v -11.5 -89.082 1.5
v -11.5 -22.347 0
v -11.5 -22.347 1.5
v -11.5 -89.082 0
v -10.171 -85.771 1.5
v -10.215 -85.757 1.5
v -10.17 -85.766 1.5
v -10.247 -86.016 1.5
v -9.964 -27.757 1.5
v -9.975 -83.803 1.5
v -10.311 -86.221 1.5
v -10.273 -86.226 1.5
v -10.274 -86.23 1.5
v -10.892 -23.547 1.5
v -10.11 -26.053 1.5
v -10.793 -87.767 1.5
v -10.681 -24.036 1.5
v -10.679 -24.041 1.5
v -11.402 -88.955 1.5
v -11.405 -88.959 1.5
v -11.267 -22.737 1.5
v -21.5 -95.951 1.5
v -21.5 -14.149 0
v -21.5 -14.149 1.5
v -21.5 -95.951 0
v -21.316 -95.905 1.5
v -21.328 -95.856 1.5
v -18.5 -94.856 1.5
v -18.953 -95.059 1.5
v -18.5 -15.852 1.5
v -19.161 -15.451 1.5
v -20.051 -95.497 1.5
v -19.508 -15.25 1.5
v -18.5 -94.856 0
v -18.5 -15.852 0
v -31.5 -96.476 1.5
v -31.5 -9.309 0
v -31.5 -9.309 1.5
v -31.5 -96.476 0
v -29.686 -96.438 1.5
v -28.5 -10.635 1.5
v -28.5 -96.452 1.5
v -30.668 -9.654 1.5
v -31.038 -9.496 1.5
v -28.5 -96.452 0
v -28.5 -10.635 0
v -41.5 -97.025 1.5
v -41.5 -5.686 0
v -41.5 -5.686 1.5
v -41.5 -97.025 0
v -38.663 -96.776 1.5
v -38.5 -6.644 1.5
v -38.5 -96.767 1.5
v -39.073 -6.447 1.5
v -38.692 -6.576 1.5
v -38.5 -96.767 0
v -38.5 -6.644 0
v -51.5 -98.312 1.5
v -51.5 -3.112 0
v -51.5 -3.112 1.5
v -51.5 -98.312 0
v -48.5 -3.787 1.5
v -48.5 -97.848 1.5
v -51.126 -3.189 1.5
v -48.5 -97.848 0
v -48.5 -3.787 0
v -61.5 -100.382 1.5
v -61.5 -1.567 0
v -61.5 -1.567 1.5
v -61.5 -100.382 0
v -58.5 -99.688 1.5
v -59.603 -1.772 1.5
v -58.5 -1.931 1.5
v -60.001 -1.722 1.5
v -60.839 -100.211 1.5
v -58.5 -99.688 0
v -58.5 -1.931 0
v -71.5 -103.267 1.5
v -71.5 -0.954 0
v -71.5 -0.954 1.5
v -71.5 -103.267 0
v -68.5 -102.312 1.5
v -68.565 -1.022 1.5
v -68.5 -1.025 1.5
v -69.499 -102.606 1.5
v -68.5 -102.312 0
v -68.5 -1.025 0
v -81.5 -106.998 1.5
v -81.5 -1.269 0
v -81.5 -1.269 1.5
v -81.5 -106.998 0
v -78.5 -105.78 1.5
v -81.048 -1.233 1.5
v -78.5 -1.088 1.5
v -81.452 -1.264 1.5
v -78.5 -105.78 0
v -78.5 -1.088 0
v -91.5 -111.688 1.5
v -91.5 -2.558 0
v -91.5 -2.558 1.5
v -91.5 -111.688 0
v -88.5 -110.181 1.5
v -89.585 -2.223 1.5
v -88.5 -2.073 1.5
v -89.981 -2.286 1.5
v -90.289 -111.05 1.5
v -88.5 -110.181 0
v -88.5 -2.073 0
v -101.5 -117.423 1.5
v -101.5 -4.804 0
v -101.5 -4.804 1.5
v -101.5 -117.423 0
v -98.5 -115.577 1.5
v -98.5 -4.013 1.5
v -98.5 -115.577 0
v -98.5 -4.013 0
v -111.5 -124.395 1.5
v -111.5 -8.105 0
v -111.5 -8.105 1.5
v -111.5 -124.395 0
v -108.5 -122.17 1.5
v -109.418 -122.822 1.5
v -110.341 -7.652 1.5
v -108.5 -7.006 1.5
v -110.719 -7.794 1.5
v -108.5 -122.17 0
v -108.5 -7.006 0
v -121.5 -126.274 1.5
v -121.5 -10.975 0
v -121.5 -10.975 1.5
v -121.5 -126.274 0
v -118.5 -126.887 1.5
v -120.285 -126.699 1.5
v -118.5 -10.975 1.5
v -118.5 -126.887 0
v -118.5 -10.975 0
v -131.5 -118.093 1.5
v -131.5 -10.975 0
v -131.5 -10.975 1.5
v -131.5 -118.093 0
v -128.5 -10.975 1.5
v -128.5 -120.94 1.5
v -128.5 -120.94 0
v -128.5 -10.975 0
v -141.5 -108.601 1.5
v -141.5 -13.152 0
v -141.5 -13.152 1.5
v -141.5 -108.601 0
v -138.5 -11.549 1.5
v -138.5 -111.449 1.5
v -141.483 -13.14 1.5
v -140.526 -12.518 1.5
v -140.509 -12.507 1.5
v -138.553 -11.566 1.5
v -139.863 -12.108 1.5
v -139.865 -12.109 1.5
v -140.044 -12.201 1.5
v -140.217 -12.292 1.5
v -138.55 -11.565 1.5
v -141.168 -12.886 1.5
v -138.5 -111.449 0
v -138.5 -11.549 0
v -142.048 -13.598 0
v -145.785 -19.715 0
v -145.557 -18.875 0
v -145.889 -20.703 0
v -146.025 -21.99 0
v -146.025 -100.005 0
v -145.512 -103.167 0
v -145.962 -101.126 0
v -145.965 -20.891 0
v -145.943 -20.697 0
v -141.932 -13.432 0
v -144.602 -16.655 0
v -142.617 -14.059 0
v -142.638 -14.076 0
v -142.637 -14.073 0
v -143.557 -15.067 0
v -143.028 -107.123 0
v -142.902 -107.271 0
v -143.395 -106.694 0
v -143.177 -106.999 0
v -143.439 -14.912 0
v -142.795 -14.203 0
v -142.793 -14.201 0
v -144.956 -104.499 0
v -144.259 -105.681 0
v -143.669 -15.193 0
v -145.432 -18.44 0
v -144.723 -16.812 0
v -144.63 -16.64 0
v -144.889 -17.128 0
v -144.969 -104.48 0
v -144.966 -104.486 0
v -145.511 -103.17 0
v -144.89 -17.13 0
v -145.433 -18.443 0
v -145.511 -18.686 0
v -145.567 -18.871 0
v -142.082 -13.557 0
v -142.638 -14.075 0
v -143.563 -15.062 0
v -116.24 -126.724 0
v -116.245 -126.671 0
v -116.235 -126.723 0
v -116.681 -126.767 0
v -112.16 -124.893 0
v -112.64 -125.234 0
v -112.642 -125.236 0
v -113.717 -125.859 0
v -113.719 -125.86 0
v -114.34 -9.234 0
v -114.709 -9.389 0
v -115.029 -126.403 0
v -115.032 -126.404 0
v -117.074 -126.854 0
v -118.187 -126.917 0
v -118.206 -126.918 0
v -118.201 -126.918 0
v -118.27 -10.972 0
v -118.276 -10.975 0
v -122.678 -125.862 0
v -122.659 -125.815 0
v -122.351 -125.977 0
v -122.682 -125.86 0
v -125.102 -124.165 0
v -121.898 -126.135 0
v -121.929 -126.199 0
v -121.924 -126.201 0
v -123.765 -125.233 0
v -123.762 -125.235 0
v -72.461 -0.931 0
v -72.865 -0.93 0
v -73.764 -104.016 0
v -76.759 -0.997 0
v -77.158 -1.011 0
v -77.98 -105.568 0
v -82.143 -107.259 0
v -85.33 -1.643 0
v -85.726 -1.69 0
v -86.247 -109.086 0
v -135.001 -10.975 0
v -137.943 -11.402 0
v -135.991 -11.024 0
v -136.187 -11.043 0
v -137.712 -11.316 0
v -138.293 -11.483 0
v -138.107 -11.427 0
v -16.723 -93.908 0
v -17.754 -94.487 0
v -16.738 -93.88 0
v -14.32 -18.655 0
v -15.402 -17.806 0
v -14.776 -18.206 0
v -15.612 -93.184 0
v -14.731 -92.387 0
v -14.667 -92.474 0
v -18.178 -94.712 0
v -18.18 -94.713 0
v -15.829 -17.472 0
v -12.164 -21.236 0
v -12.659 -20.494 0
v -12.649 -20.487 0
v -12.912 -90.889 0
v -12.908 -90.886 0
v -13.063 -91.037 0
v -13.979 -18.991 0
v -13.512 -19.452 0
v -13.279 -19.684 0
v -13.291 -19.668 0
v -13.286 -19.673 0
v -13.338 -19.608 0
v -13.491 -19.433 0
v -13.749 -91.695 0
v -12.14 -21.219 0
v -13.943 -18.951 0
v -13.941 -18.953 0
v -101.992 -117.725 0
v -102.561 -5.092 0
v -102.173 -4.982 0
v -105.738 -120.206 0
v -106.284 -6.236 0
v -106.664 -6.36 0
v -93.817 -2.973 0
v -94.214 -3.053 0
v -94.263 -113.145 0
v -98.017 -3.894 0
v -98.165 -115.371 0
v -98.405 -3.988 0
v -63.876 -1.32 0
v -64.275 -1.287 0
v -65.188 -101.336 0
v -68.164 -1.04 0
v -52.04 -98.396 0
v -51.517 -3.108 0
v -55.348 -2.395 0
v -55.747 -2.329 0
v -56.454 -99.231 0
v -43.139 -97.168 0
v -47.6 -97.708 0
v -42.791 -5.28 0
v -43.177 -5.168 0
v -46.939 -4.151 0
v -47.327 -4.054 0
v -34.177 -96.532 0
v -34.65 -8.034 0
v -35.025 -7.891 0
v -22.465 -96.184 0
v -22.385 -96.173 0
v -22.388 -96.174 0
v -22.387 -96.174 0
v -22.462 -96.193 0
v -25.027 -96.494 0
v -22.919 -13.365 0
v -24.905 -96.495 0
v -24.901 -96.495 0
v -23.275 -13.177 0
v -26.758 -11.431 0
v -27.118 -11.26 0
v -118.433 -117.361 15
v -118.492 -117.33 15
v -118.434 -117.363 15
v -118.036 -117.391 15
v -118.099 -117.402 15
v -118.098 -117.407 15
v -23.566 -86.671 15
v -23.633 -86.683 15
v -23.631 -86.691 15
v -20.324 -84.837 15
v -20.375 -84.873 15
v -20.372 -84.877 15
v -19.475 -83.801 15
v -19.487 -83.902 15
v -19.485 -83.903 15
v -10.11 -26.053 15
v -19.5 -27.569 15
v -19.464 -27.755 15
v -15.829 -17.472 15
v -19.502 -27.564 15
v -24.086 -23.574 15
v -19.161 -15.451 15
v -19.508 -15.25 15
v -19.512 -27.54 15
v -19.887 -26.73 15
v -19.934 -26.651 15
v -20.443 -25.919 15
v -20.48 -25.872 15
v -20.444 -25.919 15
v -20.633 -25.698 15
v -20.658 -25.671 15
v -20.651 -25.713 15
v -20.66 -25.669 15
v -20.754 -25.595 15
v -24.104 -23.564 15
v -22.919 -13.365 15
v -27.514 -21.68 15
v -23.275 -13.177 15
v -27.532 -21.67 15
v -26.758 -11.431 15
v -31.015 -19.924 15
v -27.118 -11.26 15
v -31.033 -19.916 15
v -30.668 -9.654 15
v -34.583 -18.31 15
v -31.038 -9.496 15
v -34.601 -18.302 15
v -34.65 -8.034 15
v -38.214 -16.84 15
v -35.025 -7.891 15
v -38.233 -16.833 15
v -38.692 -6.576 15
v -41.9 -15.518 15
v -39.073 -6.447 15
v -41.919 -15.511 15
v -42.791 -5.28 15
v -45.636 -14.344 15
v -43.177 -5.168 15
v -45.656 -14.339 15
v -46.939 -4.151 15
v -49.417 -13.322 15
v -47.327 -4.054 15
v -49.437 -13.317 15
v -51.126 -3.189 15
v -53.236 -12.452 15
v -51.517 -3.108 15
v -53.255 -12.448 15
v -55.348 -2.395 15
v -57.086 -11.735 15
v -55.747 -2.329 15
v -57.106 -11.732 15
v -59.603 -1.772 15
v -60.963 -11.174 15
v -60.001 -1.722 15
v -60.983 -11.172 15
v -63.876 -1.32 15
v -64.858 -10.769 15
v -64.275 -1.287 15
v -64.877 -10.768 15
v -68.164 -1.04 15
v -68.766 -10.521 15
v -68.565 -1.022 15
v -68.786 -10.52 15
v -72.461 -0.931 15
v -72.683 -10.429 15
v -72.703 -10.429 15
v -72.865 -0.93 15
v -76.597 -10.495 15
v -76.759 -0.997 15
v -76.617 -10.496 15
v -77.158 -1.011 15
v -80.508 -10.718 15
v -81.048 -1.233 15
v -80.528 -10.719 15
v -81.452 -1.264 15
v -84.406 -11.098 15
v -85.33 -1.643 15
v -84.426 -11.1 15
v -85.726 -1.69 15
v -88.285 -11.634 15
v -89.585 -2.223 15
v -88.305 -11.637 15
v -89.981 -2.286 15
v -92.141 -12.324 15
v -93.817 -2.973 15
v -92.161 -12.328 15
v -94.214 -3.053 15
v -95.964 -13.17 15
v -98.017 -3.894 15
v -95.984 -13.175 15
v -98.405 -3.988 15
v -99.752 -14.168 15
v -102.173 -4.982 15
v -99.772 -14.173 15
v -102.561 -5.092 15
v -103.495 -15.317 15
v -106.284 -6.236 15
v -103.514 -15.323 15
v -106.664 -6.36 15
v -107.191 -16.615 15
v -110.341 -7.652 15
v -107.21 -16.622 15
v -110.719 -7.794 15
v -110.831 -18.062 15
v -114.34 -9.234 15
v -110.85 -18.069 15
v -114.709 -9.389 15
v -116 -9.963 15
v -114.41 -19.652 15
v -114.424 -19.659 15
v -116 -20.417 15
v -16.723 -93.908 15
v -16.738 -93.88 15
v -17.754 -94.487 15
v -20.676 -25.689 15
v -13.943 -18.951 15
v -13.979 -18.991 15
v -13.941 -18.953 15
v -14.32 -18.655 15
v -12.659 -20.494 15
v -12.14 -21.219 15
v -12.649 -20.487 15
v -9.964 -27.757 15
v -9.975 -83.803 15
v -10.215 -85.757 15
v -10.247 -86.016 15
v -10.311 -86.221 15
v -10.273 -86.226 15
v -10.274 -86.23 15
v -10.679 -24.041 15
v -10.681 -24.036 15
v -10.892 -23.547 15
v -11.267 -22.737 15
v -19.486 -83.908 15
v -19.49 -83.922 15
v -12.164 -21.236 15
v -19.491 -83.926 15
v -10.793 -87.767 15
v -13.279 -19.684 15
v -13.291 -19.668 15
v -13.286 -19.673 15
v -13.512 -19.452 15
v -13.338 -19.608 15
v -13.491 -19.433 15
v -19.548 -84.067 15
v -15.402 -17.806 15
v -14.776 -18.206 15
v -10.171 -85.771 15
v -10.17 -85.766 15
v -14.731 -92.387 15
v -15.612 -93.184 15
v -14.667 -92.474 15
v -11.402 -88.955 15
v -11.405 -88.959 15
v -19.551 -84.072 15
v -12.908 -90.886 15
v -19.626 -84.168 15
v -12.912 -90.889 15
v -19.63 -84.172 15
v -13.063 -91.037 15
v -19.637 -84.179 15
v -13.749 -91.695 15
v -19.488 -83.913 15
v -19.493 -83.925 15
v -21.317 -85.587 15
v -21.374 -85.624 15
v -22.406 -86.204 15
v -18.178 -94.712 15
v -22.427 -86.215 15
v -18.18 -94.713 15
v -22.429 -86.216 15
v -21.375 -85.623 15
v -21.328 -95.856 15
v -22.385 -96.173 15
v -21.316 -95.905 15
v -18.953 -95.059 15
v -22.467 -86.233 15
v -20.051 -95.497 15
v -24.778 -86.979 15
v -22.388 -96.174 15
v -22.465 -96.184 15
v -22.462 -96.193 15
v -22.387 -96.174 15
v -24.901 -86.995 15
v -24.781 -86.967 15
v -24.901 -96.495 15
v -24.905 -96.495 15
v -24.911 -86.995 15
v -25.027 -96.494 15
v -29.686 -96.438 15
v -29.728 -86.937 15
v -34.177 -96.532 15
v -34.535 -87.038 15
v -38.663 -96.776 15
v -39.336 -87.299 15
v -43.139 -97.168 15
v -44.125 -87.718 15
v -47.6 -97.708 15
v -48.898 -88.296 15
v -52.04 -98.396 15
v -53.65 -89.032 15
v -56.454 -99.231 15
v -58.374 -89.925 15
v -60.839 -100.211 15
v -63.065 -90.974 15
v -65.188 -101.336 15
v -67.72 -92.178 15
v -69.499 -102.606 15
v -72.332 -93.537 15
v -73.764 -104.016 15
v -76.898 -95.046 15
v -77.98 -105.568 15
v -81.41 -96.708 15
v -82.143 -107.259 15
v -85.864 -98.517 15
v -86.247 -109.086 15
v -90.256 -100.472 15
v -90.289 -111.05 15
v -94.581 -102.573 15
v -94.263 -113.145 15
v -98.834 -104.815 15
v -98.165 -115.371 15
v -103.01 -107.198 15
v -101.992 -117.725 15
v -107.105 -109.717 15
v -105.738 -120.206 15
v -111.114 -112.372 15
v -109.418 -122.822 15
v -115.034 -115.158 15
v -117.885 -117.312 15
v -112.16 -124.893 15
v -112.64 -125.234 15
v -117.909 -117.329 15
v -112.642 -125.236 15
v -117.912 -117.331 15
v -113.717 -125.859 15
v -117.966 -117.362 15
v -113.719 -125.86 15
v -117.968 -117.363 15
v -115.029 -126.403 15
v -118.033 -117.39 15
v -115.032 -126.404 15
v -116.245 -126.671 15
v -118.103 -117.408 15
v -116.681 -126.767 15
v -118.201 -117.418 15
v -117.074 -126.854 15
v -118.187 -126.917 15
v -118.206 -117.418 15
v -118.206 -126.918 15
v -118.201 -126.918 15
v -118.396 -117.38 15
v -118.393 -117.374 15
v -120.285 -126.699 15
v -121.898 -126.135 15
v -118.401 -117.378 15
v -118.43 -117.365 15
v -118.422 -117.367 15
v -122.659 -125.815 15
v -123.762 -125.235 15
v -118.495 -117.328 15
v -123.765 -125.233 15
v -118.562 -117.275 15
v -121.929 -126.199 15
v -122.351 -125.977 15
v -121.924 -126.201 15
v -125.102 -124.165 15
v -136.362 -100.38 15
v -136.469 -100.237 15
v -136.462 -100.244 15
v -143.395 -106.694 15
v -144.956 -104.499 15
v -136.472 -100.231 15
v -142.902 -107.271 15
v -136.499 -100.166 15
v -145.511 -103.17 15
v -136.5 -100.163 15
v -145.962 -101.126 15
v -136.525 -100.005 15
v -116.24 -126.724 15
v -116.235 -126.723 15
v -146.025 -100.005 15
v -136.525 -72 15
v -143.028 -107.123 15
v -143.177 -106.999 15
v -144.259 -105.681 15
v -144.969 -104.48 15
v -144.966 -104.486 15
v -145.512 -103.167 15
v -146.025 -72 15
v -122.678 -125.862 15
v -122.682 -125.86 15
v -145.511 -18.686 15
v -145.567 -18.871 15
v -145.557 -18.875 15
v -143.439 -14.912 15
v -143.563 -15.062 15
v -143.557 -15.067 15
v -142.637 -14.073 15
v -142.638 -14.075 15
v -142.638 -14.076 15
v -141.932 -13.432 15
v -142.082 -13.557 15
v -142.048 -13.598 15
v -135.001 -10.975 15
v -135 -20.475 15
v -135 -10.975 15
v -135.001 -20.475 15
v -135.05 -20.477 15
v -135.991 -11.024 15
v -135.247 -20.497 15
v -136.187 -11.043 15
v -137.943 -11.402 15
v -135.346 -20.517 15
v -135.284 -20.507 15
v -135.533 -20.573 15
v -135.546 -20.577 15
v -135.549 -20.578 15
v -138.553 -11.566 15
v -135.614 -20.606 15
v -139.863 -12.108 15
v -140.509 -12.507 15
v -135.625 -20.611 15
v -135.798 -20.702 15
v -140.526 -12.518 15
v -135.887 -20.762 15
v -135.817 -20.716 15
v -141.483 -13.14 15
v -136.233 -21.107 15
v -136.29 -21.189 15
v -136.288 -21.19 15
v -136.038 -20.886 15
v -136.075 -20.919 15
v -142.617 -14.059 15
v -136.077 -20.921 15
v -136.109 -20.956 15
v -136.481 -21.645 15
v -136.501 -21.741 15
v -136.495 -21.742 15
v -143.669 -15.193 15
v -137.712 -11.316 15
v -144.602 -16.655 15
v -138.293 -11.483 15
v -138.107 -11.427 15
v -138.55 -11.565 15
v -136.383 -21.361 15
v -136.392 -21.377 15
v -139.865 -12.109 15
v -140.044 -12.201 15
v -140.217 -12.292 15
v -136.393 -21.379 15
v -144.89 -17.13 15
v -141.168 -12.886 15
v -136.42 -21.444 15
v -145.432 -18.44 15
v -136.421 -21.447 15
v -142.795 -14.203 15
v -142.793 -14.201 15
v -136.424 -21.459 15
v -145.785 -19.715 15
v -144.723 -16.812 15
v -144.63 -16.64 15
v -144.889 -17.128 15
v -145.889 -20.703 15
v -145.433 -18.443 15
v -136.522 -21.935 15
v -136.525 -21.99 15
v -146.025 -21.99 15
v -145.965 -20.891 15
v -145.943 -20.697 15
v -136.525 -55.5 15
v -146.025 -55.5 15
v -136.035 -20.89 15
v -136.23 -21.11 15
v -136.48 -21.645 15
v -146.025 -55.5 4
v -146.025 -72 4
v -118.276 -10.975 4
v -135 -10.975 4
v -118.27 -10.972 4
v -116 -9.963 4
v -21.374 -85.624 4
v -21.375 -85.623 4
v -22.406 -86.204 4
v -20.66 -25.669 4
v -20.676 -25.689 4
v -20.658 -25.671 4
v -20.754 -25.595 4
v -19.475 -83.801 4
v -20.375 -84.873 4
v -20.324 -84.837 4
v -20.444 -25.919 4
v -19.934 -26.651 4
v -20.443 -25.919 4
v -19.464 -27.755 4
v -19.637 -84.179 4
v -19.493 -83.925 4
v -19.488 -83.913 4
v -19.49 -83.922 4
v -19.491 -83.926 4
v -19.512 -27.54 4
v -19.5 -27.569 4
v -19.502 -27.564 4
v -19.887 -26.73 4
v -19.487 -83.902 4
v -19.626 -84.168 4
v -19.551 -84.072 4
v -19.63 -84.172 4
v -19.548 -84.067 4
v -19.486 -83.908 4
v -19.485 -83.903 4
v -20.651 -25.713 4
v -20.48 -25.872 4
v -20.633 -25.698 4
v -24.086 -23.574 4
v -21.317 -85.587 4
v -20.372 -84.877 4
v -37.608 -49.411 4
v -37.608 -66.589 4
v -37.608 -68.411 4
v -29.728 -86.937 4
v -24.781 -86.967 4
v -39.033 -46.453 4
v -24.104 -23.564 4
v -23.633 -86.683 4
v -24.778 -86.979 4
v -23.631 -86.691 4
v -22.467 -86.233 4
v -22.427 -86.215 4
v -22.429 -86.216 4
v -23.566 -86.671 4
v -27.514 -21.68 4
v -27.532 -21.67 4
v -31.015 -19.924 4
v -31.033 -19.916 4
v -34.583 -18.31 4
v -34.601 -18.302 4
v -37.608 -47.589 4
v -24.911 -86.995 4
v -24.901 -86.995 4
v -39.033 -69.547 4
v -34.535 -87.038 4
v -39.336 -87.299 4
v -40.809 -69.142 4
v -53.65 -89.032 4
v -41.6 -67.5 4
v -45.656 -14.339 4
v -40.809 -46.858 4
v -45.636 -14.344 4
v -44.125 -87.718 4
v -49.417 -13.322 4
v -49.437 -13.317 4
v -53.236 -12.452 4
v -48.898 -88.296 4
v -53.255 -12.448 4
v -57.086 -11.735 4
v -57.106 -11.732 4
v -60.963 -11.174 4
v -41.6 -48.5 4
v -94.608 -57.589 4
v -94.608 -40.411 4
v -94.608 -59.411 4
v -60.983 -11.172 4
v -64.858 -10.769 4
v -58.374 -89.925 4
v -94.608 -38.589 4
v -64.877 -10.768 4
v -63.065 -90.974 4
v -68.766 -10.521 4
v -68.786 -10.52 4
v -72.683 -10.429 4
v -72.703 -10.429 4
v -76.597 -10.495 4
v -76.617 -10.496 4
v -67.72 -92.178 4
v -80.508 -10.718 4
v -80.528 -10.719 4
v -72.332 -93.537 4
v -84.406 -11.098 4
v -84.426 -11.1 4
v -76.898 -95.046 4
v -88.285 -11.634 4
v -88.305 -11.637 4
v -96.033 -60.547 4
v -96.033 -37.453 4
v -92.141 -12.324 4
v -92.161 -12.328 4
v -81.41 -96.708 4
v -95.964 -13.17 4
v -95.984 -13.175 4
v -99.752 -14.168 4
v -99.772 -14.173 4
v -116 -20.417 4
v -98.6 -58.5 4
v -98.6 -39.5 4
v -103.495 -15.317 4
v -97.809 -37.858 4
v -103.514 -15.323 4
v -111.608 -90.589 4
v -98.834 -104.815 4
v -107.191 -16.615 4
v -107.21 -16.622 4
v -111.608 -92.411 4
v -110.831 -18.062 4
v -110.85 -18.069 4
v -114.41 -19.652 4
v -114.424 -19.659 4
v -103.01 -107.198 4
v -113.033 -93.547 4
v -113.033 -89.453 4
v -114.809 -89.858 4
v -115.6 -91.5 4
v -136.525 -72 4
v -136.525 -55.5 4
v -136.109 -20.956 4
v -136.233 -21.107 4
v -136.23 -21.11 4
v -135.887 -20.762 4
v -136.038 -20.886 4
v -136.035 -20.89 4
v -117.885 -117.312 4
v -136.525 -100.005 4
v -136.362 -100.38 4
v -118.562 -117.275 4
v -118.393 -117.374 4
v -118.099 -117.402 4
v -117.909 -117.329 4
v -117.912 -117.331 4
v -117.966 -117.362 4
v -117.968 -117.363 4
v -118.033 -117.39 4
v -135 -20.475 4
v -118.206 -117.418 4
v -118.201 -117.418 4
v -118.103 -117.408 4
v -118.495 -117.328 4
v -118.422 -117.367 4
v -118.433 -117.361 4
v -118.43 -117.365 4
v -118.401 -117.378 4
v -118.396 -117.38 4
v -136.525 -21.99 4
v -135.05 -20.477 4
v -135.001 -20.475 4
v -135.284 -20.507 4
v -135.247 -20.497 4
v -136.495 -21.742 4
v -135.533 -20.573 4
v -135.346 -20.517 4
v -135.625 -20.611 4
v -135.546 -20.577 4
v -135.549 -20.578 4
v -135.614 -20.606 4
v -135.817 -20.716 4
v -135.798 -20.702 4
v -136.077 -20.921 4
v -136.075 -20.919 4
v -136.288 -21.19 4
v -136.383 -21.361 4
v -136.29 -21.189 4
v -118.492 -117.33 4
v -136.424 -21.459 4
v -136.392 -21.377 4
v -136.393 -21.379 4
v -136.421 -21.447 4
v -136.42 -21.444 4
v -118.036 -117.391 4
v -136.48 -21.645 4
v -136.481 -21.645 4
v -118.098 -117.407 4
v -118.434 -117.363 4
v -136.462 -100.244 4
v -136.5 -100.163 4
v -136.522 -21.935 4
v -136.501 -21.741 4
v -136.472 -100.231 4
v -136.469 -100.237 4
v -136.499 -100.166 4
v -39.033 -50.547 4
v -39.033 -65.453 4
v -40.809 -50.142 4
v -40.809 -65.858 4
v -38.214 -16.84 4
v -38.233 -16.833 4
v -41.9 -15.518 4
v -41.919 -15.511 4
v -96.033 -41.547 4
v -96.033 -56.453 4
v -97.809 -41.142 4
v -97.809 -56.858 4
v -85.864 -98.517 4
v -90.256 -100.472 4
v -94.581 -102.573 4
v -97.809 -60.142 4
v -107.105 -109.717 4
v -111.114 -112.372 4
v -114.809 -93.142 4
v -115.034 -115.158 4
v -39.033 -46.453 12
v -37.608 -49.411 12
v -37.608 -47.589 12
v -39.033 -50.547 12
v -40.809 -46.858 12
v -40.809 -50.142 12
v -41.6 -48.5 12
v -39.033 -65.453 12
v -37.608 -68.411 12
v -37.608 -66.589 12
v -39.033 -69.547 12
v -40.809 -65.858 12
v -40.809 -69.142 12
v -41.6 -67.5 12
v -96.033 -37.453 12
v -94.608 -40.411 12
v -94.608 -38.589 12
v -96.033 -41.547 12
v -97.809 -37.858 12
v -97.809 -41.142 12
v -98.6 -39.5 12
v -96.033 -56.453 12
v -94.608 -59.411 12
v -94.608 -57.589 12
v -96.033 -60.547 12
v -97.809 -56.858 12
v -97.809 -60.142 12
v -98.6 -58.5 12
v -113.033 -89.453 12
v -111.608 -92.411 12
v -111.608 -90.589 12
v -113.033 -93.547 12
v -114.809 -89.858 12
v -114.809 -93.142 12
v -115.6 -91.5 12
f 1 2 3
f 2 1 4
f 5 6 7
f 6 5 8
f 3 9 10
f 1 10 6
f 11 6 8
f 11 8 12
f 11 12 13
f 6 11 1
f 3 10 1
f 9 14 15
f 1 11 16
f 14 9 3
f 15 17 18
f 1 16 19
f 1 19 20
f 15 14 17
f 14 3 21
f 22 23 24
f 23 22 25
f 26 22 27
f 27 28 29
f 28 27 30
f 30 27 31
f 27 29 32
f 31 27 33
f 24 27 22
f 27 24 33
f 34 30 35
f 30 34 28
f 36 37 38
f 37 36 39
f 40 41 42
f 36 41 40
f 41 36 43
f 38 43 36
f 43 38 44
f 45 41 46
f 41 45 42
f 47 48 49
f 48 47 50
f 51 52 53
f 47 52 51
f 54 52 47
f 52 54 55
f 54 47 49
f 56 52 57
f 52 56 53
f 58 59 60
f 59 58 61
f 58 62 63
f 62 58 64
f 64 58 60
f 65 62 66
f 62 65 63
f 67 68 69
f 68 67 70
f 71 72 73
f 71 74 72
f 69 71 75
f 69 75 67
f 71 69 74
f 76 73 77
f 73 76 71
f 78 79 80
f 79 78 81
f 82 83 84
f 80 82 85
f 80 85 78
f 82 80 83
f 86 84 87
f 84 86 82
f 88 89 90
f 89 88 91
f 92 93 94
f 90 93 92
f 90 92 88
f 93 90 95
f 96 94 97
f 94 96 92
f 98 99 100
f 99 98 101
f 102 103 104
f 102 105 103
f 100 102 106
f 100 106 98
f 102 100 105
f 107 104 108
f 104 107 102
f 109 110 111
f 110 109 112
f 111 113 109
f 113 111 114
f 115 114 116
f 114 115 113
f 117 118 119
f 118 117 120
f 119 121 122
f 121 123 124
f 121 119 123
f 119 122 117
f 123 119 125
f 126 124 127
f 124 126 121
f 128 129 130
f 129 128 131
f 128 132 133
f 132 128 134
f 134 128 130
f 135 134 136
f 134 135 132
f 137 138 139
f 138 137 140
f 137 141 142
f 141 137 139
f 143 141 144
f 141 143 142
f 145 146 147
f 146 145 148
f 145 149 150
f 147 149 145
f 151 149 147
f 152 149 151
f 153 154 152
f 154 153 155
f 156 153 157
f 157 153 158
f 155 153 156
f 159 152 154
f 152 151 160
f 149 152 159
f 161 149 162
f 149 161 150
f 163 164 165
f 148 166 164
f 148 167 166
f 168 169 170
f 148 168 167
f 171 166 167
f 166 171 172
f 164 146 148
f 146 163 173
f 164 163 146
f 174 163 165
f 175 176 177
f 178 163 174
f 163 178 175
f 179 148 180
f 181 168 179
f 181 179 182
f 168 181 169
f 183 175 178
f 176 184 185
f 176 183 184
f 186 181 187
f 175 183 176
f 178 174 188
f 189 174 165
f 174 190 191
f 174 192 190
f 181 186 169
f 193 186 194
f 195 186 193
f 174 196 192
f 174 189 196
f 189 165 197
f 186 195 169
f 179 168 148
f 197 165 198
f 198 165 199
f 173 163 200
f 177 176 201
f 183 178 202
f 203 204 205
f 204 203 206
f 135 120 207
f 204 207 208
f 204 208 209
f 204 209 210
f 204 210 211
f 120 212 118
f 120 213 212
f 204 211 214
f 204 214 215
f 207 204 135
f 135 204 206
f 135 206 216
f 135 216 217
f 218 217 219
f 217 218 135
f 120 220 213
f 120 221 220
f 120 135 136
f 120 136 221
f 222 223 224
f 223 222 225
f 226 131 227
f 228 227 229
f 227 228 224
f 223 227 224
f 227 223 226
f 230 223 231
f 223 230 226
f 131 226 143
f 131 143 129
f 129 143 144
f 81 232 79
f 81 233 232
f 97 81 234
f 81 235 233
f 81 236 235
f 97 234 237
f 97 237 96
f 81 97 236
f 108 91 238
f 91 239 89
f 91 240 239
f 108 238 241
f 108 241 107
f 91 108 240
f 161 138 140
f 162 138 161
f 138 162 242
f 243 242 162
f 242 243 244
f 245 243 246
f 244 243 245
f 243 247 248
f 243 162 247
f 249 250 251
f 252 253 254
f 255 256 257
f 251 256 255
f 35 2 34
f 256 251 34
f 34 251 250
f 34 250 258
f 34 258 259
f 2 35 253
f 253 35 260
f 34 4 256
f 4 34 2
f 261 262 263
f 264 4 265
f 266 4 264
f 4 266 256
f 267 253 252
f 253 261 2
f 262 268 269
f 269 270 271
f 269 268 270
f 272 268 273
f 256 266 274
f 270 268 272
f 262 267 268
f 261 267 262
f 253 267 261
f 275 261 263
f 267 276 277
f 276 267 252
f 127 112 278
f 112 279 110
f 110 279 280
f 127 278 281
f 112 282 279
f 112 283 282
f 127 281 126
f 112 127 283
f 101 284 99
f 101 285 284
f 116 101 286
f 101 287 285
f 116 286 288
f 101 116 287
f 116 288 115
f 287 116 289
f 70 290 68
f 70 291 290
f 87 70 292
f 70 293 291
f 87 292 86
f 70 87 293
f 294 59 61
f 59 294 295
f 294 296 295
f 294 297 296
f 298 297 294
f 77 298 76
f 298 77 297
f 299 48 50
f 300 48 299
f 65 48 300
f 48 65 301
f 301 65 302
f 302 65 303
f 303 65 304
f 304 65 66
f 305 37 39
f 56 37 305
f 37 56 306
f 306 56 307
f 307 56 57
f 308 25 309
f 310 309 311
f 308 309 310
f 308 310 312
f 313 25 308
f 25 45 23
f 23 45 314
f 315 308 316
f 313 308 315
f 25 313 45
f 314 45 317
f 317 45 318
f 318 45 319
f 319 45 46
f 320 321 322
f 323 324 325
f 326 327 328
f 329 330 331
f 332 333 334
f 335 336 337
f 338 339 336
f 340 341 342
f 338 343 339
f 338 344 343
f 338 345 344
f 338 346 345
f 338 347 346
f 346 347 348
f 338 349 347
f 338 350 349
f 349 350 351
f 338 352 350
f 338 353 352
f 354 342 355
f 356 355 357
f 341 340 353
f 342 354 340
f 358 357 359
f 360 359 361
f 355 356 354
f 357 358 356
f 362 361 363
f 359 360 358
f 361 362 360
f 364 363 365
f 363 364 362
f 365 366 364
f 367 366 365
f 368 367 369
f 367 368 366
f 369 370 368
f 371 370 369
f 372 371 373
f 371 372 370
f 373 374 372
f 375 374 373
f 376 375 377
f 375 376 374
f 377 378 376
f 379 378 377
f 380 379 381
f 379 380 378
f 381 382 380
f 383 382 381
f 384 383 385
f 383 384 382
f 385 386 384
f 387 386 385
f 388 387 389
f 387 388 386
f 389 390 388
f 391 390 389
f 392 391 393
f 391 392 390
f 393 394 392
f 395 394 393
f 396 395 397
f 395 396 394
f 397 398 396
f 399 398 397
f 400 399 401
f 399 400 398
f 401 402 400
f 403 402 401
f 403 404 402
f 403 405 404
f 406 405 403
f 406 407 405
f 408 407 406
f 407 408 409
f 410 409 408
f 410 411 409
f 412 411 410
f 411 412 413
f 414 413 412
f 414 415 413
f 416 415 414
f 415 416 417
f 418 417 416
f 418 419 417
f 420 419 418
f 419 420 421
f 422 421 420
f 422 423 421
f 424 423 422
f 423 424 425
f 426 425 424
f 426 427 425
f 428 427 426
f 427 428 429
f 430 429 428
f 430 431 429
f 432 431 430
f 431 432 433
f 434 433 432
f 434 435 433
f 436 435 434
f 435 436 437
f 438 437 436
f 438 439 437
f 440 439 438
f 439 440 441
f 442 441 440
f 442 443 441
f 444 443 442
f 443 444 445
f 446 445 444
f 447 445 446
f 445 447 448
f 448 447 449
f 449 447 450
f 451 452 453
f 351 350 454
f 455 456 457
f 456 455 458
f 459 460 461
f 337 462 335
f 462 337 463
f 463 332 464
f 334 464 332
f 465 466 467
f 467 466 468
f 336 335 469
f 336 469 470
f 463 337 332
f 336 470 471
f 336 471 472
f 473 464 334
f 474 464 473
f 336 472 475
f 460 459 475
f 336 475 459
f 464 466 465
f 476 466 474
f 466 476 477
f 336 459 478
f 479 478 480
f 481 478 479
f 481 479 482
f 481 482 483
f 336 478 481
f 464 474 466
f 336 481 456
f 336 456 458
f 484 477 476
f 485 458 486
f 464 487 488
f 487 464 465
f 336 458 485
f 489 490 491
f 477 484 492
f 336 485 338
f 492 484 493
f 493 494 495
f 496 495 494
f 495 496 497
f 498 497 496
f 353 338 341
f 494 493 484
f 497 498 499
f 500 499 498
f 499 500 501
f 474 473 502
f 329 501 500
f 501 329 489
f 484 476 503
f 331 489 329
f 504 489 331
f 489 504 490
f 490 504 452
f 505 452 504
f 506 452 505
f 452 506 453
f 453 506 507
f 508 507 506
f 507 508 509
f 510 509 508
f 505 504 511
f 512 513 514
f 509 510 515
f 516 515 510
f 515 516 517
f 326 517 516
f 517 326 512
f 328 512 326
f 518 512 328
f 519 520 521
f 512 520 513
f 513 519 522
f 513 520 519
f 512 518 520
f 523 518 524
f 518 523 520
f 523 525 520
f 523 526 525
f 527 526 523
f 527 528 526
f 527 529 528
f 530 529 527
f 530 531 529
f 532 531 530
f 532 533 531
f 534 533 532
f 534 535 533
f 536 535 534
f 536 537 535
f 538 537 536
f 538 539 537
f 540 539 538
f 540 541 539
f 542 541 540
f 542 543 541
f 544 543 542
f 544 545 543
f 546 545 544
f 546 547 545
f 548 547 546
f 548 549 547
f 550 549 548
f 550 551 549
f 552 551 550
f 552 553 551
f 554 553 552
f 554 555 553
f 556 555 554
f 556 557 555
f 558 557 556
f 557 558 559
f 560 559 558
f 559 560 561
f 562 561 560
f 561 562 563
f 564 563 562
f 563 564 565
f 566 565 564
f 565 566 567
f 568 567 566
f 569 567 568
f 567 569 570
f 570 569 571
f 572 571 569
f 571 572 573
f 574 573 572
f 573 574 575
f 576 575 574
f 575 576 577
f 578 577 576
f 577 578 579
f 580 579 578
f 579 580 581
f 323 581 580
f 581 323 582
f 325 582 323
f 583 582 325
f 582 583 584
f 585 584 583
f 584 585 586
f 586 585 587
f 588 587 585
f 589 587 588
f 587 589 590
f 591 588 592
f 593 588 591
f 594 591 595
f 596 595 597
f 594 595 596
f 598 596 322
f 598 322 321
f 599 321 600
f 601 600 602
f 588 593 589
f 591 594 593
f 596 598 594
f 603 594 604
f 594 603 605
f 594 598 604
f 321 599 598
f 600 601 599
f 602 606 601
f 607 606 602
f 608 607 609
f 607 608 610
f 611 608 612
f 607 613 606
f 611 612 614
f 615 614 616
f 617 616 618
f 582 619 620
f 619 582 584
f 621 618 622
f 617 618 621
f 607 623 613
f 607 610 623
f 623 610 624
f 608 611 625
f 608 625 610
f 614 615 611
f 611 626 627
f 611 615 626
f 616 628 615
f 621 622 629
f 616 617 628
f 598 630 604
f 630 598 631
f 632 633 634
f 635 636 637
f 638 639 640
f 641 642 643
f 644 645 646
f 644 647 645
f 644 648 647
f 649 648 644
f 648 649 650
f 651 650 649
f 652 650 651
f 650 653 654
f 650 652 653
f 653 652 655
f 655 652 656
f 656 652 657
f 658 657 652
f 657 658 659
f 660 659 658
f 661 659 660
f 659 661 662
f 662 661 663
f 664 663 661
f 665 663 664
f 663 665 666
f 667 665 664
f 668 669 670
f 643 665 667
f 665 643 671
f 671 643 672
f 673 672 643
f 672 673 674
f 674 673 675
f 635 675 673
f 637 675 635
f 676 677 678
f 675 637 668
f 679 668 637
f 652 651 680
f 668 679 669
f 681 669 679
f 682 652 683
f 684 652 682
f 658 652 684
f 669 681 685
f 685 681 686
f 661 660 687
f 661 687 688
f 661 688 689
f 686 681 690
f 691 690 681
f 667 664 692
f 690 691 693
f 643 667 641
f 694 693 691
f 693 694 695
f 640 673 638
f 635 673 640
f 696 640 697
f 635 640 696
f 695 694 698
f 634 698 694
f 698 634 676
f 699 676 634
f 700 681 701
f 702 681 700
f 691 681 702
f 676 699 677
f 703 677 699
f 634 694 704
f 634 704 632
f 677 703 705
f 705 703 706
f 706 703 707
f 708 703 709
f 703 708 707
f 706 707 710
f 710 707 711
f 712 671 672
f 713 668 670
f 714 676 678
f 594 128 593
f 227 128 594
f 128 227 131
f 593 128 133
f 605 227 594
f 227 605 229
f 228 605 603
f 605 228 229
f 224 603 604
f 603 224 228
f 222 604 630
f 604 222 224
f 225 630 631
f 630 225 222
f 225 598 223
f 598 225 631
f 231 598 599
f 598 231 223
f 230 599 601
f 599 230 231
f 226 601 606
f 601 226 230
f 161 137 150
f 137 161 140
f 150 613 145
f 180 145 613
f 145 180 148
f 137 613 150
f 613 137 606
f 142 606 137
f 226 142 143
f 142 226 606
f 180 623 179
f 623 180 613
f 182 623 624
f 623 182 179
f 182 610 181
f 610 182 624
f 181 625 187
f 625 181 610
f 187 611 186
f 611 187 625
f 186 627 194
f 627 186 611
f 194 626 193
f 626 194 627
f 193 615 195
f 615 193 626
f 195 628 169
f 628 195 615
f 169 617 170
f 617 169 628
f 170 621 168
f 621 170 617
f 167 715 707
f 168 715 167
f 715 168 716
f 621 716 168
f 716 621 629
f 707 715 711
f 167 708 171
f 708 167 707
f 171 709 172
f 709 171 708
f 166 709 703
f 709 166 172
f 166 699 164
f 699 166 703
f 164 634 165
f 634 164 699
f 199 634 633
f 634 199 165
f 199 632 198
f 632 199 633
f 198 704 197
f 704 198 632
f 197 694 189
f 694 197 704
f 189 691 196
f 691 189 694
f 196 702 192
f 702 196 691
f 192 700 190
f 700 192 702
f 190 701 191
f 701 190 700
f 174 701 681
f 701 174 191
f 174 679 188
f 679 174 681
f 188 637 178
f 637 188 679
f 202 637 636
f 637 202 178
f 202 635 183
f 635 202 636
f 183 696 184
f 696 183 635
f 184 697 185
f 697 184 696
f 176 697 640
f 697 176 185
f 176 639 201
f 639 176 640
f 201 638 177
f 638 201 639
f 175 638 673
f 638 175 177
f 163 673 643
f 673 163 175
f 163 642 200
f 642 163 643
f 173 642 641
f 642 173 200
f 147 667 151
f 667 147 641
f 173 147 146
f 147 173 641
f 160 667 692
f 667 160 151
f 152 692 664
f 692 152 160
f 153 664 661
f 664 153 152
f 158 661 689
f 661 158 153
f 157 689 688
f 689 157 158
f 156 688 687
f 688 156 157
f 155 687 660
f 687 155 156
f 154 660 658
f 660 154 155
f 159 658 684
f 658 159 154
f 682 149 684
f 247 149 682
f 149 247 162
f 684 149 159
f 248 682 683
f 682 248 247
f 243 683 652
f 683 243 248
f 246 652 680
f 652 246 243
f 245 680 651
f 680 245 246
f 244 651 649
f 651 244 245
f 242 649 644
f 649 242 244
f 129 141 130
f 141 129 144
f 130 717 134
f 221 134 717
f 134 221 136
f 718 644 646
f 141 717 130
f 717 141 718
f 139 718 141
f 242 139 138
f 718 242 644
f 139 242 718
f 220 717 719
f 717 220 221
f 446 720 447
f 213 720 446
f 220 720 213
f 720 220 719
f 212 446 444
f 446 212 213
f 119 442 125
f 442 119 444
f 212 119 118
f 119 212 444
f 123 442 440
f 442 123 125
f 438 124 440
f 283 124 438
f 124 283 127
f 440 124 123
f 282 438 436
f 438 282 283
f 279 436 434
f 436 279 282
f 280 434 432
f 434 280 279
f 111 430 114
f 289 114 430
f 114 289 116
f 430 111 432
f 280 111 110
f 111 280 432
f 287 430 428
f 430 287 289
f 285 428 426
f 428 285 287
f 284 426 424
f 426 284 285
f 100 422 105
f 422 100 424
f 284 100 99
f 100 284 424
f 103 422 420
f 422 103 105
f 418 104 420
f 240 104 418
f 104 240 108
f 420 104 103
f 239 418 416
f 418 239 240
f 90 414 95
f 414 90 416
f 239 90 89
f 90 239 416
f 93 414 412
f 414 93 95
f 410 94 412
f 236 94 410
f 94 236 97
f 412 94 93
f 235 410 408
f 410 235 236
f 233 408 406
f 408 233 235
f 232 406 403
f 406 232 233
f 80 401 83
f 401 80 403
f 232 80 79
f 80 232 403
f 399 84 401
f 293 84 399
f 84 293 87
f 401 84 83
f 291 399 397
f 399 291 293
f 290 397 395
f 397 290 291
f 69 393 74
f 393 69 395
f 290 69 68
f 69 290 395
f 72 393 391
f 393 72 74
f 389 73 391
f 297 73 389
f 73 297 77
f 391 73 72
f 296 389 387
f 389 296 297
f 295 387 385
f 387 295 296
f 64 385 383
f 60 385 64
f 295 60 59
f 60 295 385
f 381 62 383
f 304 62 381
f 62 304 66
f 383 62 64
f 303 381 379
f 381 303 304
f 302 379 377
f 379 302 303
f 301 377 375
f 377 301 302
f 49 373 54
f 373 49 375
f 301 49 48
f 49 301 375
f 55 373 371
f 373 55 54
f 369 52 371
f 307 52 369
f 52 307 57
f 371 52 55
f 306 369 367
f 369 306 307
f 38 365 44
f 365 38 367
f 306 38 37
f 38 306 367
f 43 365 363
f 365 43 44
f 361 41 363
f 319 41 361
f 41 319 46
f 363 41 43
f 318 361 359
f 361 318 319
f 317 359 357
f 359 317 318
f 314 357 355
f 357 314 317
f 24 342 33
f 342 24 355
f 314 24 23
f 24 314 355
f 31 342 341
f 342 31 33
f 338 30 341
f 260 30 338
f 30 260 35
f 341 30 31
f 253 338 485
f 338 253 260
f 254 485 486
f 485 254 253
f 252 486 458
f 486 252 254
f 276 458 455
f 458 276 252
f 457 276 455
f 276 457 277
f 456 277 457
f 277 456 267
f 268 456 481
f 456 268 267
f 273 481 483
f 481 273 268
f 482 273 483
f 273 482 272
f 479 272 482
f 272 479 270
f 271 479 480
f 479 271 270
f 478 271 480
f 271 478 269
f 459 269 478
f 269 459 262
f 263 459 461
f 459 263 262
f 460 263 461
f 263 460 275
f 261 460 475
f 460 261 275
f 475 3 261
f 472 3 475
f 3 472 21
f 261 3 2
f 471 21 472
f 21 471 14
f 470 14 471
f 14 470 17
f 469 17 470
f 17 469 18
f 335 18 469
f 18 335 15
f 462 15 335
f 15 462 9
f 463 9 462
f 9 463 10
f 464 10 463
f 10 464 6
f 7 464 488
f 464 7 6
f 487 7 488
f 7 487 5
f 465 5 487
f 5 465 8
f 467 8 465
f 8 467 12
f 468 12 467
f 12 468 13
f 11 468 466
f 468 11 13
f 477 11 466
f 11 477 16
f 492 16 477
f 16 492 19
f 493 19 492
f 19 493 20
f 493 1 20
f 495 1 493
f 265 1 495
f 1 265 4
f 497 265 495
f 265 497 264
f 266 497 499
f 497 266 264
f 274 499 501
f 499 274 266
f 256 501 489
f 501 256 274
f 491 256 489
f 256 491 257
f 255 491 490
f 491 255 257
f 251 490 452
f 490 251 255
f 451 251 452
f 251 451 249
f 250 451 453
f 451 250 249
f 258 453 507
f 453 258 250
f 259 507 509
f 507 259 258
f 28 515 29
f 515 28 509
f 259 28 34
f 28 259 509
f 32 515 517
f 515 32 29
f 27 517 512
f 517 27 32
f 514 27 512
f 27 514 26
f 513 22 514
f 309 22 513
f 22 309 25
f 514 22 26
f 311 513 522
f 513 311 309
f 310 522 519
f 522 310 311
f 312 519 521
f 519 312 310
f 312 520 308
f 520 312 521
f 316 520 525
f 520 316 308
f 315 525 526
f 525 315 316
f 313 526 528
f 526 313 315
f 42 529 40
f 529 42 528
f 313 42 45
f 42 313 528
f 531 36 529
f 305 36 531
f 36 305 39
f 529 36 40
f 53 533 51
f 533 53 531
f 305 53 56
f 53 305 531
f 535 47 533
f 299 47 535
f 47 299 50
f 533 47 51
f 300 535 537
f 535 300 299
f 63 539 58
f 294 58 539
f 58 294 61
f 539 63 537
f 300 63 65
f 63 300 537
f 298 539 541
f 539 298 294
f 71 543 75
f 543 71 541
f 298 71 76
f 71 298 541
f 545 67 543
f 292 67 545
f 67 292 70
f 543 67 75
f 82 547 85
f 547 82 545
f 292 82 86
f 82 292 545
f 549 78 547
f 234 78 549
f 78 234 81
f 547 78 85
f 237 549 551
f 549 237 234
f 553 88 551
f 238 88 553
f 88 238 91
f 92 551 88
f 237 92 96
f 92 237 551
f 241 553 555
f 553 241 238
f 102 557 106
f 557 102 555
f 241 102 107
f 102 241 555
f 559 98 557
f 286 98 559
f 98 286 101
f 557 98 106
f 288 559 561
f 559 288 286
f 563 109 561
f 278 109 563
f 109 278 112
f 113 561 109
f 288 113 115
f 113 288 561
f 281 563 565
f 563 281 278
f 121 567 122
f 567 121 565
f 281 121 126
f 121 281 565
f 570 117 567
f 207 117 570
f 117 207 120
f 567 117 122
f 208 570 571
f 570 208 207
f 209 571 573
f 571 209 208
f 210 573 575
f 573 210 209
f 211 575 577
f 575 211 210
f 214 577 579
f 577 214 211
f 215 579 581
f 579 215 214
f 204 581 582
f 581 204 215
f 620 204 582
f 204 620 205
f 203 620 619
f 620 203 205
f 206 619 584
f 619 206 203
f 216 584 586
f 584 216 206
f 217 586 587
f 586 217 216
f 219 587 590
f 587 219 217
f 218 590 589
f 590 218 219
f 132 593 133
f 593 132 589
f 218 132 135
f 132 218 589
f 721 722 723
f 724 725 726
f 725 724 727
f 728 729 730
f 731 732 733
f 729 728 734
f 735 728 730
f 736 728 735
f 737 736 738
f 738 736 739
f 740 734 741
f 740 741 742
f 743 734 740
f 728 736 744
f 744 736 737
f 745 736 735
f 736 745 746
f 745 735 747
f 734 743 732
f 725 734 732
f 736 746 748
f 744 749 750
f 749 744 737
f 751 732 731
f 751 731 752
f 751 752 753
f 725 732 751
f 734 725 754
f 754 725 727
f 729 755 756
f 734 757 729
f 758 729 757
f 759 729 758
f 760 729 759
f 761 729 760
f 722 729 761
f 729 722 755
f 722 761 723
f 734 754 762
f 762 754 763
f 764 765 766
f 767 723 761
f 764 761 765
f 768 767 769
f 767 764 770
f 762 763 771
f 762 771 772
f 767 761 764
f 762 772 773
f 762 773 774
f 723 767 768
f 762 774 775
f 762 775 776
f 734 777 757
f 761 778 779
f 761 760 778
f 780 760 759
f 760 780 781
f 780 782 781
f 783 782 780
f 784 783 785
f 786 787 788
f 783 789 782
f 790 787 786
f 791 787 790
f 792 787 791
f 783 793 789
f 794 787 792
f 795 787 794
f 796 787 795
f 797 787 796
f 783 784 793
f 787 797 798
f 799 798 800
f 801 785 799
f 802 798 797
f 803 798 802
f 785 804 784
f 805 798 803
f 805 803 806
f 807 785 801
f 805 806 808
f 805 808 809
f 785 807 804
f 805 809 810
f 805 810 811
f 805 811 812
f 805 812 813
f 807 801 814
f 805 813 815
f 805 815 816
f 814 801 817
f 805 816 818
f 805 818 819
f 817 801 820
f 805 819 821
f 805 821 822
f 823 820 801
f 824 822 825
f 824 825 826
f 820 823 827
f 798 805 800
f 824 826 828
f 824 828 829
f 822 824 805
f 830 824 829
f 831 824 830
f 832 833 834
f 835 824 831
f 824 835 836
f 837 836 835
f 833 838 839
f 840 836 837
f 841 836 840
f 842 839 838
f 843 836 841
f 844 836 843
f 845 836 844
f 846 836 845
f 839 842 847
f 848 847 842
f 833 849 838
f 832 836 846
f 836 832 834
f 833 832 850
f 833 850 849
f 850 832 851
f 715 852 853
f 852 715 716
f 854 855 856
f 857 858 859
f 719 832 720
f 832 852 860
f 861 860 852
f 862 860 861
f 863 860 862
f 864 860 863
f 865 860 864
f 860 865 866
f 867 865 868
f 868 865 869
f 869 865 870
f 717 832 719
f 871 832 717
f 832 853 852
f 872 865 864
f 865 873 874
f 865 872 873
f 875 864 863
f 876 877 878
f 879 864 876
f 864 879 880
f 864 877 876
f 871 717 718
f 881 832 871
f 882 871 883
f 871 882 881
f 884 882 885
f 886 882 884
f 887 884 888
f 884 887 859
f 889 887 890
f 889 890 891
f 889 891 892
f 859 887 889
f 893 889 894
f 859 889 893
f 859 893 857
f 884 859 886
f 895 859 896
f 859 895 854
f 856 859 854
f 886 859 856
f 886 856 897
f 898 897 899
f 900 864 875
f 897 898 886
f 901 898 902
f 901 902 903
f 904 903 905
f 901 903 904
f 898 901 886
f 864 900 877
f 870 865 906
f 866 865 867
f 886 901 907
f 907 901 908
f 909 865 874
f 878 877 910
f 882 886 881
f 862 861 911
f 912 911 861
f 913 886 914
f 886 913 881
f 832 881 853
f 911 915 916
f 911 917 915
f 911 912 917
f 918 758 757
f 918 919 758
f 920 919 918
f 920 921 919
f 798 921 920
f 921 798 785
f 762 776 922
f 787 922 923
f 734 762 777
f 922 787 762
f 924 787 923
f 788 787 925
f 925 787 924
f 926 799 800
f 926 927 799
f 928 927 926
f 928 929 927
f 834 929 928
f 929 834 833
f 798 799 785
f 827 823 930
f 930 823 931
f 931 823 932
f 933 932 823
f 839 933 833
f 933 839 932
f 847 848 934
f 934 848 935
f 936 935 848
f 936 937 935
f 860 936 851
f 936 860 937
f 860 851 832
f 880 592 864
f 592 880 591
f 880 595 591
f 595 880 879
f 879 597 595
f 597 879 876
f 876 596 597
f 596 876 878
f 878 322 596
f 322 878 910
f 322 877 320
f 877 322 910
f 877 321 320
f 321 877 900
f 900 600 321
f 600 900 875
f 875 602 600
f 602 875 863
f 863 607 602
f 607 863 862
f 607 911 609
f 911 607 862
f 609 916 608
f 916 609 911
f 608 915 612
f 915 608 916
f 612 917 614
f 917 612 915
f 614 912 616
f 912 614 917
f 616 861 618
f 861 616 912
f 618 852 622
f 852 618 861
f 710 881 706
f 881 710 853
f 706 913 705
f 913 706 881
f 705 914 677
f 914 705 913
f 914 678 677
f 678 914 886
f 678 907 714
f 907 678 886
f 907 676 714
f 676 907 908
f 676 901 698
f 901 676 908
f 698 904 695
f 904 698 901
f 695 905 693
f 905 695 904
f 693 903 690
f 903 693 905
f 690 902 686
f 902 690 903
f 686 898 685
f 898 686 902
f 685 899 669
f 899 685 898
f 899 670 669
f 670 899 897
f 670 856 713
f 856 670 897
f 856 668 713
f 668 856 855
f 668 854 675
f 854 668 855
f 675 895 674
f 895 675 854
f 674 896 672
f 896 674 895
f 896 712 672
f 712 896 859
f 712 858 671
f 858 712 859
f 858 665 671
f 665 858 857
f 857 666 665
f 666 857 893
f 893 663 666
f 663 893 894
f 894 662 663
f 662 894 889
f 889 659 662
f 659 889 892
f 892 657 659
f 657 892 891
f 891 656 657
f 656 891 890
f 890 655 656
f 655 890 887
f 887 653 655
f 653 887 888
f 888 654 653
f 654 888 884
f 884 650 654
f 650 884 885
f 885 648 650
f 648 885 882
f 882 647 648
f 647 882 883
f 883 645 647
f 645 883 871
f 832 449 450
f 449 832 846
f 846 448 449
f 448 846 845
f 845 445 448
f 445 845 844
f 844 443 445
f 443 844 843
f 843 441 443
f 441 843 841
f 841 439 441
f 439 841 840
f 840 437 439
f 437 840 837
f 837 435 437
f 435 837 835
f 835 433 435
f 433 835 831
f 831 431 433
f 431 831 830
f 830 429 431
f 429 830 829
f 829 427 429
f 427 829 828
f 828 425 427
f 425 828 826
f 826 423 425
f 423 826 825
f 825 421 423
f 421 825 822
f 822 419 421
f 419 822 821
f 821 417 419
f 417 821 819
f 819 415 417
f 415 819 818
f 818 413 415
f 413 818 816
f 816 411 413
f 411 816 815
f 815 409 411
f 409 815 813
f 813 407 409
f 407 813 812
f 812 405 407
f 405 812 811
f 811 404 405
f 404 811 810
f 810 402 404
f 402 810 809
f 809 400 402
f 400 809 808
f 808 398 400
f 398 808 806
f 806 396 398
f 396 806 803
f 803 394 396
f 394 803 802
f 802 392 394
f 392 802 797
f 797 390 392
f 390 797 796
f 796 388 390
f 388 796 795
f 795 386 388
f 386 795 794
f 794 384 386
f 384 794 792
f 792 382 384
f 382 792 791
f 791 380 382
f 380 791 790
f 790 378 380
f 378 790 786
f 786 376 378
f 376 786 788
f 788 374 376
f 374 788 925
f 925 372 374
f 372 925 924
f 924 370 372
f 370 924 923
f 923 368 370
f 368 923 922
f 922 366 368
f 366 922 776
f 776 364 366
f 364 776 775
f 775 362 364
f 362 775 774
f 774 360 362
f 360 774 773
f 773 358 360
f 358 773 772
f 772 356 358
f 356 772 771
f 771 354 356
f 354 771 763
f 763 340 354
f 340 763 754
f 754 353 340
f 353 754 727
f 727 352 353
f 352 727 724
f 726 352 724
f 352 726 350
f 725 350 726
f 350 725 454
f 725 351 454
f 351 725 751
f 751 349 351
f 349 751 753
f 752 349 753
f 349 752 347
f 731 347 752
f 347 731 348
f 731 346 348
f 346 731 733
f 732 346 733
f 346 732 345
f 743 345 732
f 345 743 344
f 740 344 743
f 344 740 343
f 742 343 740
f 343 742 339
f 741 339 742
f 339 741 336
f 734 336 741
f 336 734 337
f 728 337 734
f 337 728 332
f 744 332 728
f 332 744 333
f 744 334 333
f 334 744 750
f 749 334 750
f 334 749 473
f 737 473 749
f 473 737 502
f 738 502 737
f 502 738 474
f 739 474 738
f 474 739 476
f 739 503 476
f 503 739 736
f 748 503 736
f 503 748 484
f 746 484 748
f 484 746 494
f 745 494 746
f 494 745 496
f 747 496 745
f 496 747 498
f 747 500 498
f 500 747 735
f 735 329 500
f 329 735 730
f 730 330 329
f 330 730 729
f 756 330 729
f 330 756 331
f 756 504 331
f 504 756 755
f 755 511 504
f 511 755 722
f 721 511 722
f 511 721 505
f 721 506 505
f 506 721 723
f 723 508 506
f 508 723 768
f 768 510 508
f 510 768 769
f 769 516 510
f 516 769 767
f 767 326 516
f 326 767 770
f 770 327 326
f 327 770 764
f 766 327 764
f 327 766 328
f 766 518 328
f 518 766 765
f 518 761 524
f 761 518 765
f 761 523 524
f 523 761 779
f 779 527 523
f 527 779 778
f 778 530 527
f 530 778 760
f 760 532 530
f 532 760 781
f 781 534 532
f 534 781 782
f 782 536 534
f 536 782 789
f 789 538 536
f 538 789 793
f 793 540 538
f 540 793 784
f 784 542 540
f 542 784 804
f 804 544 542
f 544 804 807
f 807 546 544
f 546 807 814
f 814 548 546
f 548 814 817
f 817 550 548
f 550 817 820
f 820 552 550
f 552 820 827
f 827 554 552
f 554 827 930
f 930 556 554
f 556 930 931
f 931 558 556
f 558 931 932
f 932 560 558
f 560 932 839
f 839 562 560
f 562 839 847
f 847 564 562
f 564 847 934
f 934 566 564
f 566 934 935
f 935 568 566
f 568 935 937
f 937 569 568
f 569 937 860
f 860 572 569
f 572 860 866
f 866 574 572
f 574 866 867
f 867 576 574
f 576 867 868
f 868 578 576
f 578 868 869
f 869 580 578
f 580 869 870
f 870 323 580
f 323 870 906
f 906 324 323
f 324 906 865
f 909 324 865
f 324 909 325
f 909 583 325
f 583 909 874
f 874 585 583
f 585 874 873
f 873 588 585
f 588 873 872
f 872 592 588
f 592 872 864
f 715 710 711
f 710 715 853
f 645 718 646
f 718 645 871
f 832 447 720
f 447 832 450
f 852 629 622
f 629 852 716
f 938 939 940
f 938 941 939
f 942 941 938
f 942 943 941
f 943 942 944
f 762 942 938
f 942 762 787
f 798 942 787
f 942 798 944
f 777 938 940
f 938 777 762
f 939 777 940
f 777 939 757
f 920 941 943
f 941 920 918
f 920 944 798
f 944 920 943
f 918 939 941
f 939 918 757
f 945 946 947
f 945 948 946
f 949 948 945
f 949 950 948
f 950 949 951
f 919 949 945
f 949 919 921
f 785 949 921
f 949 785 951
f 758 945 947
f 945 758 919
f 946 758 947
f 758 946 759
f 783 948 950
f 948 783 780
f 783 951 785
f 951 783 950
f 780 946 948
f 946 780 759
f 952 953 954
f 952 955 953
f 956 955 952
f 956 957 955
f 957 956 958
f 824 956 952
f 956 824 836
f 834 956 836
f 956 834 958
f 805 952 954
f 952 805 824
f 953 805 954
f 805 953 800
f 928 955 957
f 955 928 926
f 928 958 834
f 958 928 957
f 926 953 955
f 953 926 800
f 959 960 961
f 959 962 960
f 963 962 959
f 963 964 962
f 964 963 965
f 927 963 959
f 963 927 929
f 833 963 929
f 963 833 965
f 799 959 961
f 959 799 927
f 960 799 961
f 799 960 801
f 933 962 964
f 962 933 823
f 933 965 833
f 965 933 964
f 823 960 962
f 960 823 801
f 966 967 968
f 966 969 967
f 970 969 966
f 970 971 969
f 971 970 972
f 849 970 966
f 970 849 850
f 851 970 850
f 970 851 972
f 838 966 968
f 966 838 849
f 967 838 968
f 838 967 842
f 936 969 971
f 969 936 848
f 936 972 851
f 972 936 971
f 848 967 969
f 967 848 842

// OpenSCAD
module
shape_of_pcb()
{
    import("edge-cuts.dxf");
}

module
base_shape()
{
    linear_extrude(height = 15) offset(10) shape_of_pcb();
}

module
inner_space()
{
    linear_extrude(height = 15) offset(0.5) shape_of_pcb();
}

module
promicro_trrs_space()
{
    linear_extrude(height = 12) polygon(points = [
        [ 116, -5 ],
        [ 116, -55.5 ],
        [ 121, -55.5 ],
        [ 121, -72 ],
        [ 155, -72 ],
        [ 155, -55.5 ],
        [ 135, -55.5 ],
        [ 135, -5 ]
    ]);
}

module
spacer_thing()
{
    translate([0, 0, 4]) cylinder(r = 2.1, h = 8, center = true);
}

module
bottom_hull()
{
    hull()
    {
        children();
        linear_extrude(height = 1) projection() children();
    }
}

mirror([1, 0, 0]) 
union()
{
    difference()
    {
        base_shape();
        translate([ 0, 0, 4 ]) inner_space();
        translate([ 0, 0, 4 ]) promicro_trrs_space();
        for (i = [0:20]) {
            translate([ (i * 10), 0, 0 ])
                cube(size = [ 3, 500, 3 ], center = true);
        }
    }
    translate([ 39.5, -48.5, 4 ]) spacer_thing();
    translate([ 39.5, -67.5, 4 ]) spacer_thing();
    translate([ 96.5, -39.5, 4 ]) spacer_thing();
    translate([ 96.5, -58.5, 4 ]) spacer_thing();
    translate([ 113.5, -91.5, 4 ]) spacer_thing();
}

/*
difference()
{
    translate([ 0, 0, -10 ]) difference()
    {
        bottom_hull() rotate([ 0, -20, 0 ]) base_shape();
        rotate([ 0, -20, 0 ]) translate([ 0, 0, 4 ]) inner_space();
        rotate([ 0, -20, 0 ]) translate([ 0, 0, 4 ]) promicro_trrs_space();
        translate([ 0, 0, -10 ]) bottom_hull() rotate([ 0, -20, 0 ])
            linear_extrude(height = 1) offset(0.5) shape_of_pcb();
    }
    translate([ 0, 0, -125 ]) cube(size = [ 350, 350, 250 ], center = true);
}
*/
